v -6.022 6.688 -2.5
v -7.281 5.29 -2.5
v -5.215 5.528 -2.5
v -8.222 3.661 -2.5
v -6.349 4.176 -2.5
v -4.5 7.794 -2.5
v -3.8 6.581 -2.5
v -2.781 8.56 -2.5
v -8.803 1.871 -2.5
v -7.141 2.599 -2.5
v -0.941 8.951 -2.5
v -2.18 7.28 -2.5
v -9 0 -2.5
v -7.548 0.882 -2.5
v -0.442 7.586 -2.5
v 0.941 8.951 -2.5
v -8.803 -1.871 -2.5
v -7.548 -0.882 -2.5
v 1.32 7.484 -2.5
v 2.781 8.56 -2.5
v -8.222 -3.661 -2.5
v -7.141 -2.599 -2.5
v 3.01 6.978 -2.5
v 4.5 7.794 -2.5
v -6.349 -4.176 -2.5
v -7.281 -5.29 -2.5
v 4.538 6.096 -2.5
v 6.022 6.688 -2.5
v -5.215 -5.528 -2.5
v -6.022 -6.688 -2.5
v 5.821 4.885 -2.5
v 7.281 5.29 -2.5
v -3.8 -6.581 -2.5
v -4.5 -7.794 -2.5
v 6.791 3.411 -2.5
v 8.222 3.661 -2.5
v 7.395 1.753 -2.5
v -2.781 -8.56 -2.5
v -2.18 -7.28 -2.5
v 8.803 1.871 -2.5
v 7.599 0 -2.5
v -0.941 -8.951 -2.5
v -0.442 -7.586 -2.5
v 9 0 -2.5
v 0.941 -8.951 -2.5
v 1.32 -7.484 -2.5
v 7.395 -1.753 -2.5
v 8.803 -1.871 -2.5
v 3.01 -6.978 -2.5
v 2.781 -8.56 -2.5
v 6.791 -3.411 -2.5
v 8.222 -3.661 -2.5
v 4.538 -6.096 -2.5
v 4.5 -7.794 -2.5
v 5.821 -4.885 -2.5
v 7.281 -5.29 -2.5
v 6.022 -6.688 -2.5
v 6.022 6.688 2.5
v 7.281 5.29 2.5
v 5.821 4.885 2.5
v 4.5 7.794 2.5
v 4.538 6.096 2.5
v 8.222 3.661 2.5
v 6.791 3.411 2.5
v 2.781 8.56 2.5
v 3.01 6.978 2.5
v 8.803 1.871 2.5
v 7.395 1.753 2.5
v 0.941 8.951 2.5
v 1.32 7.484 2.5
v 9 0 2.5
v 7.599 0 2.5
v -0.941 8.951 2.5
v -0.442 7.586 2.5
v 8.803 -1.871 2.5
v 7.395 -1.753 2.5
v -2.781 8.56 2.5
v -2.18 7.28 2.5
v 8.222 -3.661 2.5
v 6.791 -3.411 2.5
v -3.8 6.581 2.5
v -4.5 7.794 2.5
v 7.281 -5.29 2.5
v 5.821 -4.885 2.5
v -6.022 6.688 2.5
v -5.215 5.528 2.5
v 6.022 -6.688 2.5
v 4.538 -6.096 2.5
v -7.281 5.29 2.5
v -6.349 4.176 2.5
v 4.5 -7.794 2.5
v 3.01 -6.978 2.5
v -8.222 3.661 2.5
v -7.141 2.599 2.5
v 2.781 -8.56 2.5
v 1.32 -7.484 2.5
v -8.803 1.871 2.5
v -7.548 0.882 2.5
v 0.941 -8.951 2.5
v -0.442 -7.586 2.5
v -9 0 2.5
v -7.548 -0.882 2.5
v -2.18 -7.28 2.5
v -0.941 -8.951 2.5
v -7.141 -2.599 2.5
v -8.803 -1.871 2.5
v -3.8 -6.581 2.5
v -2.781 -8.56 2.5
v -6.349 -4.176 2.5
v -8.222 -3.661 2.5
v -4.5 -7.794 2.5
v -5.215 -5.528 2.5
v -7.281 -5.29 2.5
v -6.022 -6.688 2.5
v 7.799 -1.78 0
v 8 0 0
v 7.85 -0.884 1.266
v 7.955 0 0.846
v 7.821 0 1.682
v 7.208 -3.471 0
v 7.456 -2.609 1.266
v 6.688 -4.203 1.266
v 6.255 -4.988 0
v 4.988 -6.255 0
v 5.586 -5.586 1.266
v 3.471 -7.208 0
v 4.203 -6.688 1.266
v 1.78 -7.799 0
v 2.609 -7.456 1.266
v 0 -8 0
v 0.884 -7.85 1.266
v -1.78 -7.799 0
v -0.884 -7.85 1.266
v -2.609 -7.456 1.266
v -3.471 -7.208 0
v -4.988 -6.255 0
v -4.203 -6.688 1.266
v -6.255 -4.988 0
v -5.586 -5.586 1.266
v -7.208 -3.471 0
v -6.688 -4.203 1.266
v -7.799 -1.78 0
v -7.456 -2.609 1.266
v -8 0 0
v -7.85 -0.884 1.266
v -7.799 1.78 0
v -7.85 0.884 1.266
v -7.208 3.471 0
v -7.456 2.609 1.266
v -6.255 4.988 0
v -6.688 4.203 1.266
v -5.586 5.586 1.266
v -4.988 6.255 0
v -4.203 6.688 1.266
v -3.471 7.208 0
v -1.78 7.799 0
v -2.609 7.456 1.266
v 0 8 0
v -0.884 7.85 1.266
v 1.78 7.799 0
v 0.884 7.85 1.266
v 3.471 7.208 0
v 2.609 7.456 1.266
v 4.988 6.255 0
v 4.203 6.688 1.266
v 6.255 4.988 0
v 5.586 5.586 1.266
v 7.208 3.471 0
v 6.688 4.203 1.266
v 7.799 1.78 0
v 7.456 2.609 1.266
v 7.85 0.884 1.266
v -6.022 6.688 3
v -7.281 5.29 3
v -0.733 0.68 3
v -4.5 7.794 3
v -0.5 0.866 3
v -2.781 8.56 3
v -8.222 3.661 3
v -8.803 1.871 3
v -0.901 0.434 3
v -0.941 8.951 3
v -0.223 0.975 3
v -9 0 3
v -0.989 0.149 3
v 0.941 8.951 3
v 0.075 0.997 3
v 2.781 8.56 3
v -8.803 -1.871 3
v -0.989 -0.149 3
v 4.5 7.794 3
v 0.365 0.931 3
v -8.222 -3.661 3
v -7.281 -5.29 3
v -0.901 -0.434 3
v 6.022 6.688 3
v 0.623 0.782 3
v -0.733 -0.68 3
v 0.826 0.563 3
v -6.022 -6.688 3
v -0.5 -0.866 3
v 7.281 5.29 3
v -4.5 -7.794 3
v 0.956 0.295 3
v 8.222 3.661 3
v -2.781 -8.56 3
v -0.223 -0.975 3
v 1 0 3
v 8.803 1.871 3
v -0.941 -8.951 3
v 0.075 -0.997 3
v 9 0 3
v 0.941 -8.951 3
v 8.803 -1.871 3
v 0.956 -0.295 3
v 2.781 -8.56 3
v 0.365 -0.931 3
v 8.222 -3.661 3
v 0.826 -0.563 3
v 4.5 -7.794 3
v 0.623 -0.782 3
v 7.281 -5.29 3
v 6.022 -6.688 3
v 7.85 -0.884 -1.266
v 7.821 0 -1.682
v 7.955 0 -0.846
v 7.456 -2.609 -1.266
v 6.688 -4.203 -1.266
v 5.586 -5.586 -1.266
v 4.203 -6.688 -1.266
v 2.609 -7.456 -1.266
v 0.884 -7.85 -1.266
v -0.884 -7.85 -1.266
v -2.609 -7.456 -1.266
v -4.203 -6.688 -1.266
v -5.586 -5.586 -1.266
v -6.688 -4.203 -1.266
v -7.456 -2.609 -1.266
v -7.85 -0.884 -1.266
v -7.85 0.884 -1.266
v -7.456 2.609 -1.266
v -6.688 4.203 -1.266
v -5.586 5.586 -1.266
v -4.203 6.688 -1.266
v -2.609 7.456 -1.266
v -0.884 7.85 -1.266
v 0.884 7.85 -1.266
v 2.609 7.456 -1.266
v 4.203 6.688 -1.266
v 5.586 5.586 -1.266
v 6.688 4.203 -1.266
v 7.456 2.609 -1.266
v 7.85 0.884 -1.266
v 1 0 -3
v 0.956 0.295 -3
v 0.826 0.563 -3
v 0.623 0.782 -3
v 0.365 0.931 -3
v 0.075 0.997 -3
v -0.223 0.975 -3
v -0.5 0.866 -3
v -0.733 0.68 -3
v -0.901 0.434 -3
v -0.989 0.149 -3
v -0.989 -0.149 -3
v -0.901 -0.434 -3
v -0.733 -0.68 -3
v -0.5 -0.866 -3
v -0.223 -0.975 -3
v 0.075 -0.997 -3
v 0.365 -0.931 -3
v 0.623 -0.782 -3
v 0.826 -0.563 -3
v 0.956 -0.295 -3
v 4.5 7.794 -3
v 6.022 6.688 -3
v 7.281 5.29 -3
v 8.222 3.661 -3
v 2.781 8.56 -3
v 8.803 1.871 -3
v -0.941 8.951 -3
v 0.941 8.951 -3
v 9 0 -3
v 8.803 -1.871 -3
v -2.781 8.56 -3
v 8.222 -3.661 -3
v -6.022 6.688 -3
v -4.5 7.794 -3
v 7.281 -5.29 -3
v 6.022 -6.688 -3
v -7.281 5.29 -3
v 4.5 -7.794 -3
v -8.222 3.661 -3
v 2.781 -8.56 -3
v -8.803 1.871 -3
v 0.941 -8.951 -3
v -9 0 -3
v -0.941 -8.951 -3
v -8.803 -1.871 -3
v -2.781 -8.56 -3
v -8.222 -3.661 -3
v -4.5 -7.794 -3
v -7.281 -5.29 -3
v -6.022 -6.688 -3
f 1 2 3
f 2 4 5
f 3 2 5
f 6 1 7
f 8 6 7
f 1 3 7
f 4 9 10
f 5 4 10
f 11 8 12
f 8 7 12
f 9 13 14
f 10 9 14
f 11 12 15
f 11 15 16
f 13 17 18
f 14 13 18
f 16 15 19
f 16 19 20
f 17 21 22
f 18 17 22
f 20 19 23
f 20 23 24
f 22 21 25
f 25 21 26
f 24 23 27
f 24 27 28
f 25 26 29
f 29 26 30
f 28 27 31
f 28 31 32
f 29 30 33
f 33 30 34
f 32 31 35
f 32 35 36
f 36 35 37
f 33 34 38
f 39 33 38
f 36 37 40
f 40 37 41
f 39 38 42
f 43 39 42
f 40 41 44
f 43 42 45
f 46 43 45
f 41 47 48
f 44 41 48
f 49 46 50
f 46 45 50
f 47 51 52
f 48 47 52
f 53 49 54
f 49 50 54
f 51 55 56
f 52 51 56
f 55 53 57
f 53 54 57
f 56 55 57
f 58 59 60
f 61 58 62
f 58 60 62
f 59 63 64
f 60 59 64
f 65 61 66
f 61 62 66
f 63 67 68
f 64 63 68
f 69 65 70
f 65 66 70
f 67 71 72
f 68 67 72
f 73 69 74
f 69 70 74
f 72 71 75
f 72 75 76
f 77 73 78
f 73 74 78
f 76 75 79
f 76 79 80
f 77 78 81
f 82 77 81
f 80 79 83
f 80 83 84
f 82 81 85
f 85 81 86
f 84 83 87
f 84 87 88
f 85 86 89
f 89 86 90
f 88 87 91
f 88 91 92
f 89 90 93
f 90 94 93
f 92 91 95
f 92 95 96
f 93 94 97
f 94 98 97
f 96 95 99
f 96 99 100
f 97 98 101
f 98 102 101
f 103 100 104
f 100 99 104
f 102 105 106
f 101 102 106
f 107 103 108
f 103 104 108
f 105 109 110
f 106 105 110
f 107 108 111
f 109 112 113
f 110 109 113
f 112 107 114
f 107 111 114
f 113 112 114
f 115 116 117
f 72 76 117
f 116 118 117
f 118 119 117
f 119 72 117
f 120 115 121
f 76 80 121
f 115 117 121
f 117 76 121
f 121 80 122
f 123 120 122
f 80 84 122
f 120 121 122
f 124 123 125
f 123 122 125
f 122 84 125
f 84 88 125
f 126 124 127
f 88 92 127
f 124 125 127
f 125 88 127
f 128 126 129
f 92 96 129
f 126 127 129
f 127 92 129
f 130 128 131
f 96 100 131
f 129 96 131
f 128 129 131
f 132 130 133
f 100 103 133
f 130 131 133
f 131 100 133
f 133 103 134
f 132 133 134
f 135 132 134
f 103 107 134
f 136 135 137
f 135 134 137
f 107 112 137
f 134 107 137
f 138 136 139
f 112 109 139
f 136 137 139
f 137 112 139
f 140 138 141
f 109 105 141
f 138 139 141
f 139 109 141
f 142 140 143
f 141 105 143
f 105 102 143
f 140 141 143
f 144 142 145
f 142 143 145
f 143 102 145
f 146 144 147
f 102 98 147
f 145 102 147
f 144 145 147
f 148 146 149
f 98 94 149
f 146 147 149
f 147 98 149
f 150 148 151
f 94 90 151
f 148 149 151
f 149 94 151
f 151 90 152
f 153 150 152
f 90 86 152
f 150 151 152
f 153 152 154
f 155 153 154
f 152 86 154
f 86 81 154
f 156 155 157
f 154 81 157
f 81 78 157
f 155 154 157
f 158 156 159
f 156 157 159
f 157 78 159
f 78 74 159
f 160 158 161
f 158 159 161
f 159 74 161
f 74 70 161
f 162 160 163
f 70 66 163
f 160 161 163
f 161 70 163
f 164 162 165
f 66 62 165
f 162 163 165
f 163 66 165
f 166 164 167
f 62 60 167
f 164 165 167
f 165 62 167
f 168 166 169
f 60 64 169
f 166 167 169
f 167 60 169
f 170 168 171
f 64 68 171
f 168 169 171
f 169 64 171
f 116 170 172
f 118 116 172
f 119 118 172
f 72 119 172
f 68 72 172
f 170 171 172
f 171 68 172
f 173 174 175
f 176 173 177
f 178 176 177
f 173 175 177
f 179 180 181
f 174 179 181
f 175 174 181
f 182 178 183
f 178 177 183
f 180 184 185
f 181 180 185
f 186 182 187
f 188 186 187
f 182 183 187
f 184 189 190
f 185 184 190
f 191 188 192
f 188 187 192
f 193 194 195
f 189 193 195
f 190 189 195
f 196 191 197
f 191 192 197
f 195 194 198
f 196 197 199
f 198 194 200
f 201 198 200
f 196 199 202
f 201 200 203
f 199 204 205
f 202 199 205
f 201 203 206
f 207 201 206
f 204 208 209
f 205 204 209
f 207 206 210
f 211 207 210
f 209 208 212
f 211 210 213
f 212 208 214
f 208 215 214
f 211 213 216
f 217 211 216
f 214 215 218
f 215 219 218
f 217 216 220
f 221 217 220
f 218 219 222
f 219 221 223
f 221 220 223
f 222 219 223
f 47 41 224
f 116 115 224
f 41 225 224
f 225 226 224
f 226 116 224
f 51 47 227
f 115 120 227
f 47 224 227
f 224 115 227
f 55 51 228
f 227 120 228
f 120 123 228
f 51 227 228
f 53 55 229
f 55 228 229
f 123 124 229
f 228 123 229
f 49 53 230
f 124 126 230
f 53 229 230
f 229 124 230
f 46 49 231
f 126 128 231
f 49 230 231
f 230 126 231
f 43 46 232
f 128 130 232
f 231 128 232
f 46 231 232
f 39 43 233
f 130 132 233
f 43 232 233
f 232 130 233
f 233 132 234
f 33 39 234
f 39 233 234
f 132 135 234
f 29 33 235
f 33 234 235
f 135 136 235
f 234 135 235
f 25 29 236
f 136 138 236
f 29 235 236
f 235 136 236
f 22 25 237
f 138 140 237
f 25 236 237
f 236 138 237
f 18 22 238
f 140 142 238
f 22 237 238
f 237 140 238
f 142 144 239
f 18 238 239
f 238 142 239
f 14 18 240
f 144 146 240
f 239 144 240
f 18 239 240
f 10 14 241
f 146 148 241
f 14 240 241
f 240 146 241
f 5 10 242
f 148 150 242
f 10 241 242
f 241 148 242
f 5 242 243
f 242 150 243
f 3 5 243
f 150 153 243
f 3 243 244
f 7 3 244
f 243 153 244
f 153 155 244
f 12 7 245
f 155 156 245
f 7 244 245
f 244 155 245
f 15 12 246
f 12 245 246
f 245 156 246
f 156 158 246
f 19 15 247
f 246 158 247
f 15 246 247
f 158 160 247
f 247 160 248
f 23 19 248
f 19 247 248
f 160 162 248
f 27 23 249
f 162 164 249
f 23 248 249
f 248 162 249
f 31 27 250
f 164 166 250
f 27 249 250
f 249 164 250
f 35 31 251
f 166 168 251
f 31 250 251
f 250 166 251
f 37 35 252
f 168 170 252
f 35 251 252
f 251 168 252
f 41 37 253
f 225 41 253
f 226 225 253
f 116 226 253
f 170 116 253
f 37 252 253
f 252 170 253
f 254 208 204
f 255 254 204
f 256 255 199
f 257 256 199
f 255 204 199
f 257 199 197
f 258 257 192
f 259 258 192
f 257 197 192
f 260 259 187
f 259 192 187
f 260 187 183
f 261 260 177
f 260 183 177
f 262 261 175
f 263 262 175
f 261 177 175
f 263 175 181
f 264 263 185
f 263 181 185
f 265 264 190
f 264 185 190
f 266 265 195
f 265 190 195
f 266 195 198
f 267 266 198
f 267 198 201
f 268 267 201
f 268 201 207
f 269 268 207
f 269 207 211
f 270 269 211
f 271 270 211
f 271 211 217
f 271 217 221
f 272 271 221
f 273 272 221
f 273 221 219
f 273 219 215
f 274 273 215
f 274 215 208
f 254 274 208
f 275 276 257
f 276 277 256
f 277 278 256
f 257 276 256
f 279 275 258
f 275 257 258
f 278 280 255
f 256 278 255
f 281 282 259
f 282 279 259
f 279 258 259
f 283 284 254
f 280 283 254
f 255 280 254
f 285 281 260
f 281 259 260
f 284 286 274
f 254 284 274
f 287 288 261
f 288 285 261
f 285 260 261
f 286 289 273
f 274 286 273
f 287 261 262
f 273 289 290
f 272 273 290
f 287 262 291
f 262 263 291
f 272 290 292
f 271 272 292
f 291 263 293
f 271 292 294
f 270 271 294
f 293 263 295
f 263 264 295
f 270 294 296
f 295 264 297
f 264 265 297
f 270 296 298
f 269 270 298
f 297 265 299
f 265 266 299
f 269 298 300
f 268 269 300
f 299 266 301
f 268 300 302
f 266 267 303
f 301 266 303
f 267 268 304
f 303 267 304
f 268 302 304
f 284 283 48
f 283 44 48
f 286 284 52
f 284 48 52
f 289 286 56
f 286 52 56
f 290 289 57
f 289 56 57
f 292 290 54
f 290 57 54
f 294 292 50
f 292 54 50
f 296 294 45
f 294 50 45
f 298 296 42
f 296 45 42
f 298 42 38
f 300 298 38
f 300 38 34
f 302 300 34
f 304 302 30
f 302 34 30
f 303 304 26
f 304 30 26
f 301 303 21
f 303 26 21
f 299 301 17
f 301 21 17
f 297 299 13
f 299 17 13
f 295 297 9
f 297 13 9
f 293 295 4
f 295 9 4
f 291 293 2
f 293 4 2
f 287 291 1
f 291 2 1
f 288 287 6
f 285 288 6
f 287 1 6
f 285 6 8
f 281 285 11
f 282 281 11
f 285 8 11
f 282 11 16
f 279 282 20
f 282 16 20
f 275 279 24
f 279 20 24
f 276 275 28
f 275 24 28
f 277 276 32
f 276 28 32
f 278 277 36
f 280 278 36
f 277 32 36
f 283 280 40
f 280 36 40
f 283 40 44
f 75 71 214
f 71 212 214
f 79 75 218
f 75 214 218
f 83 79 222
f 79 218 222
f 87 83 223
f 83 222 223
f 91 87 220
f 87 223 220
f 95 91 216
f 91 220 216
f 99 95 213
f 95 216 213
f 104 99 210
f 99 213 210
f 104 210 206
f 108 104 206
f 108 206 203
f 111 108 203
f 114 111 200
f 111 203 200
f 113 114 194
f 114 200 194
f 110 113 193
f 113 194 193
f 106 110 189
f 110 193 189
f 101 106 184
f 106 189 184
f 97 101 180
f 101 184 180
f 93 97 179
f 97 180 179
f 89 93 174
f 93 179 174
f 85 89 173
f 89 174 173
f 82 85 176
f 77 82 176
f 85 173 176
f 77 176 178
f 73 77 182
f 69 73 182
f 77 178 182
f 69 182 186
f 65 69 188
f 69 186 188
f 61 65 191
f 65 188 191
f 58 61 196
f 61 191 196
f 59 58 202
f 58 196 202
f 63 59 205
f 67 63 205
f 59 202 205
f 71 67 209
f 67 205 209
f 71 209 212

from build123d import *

# Parameters (mm, degrees)
SKETCH5_R          = 1
CUT_EXTRUDE1_DEPTH = 15.071247279


with BuildPart() as part:
    # Sketch1 → Revolve1 (revolve)
    with BuildSketch(Plane(origin=(0, 0, 0), x_dir=(0, 0, -1), z_dir=(1, 0, 0)), mode=Mode.PRIVATE) as revolve1_sk:
        with BuildLine():
            Line((0, 0), (0, 8))
            ThreePointArc((0, 8), (-1.265950905, 7.899200485), (-2.5, 7.599342077))
            Line((-2.5, 7.599342077), (-2.5, 8))
            Line((-2.5, 8), (-2.5, 9))
            Line((-2.5, 9), (-3, 9))
            Line((-3, 9), (-3, 0))
            Line((-3, 0), (0, 0))
        make_face()
        with BuildLine():
            ThreePointArc((2.5, 7.599342077), (1.265950905, 7.899200485), (0, 8))
            Line((0, 8), (0, 0))
            Line((0, 0), (3, 0))
            Line((3, 0), (3, 9))
            Line((3, 9), (2.5, 9))
            Line((2.5, 9), (2.5, 8))
            Line((2.5, 8), (2.5, 7.599342077))
        make_face()
    revolve(revolve1_sk.sketch.rotate(Axis((0, 0, 8.025320303), (0, 0, -1)), 90), axis=Axis((0, 0, 8.025320303), (0, 0, -1)))

    # Sketch5 → Cut-Extrude1 (cut, through all)
    with BuildSketch(Plane.XY.offset(3)):
        Circle(SKETCH5_R)
    extrude(amount=-CUT_EXTRUDE1_DEPTH, mode=Mode.SUBTRACT)


solid = part.part
